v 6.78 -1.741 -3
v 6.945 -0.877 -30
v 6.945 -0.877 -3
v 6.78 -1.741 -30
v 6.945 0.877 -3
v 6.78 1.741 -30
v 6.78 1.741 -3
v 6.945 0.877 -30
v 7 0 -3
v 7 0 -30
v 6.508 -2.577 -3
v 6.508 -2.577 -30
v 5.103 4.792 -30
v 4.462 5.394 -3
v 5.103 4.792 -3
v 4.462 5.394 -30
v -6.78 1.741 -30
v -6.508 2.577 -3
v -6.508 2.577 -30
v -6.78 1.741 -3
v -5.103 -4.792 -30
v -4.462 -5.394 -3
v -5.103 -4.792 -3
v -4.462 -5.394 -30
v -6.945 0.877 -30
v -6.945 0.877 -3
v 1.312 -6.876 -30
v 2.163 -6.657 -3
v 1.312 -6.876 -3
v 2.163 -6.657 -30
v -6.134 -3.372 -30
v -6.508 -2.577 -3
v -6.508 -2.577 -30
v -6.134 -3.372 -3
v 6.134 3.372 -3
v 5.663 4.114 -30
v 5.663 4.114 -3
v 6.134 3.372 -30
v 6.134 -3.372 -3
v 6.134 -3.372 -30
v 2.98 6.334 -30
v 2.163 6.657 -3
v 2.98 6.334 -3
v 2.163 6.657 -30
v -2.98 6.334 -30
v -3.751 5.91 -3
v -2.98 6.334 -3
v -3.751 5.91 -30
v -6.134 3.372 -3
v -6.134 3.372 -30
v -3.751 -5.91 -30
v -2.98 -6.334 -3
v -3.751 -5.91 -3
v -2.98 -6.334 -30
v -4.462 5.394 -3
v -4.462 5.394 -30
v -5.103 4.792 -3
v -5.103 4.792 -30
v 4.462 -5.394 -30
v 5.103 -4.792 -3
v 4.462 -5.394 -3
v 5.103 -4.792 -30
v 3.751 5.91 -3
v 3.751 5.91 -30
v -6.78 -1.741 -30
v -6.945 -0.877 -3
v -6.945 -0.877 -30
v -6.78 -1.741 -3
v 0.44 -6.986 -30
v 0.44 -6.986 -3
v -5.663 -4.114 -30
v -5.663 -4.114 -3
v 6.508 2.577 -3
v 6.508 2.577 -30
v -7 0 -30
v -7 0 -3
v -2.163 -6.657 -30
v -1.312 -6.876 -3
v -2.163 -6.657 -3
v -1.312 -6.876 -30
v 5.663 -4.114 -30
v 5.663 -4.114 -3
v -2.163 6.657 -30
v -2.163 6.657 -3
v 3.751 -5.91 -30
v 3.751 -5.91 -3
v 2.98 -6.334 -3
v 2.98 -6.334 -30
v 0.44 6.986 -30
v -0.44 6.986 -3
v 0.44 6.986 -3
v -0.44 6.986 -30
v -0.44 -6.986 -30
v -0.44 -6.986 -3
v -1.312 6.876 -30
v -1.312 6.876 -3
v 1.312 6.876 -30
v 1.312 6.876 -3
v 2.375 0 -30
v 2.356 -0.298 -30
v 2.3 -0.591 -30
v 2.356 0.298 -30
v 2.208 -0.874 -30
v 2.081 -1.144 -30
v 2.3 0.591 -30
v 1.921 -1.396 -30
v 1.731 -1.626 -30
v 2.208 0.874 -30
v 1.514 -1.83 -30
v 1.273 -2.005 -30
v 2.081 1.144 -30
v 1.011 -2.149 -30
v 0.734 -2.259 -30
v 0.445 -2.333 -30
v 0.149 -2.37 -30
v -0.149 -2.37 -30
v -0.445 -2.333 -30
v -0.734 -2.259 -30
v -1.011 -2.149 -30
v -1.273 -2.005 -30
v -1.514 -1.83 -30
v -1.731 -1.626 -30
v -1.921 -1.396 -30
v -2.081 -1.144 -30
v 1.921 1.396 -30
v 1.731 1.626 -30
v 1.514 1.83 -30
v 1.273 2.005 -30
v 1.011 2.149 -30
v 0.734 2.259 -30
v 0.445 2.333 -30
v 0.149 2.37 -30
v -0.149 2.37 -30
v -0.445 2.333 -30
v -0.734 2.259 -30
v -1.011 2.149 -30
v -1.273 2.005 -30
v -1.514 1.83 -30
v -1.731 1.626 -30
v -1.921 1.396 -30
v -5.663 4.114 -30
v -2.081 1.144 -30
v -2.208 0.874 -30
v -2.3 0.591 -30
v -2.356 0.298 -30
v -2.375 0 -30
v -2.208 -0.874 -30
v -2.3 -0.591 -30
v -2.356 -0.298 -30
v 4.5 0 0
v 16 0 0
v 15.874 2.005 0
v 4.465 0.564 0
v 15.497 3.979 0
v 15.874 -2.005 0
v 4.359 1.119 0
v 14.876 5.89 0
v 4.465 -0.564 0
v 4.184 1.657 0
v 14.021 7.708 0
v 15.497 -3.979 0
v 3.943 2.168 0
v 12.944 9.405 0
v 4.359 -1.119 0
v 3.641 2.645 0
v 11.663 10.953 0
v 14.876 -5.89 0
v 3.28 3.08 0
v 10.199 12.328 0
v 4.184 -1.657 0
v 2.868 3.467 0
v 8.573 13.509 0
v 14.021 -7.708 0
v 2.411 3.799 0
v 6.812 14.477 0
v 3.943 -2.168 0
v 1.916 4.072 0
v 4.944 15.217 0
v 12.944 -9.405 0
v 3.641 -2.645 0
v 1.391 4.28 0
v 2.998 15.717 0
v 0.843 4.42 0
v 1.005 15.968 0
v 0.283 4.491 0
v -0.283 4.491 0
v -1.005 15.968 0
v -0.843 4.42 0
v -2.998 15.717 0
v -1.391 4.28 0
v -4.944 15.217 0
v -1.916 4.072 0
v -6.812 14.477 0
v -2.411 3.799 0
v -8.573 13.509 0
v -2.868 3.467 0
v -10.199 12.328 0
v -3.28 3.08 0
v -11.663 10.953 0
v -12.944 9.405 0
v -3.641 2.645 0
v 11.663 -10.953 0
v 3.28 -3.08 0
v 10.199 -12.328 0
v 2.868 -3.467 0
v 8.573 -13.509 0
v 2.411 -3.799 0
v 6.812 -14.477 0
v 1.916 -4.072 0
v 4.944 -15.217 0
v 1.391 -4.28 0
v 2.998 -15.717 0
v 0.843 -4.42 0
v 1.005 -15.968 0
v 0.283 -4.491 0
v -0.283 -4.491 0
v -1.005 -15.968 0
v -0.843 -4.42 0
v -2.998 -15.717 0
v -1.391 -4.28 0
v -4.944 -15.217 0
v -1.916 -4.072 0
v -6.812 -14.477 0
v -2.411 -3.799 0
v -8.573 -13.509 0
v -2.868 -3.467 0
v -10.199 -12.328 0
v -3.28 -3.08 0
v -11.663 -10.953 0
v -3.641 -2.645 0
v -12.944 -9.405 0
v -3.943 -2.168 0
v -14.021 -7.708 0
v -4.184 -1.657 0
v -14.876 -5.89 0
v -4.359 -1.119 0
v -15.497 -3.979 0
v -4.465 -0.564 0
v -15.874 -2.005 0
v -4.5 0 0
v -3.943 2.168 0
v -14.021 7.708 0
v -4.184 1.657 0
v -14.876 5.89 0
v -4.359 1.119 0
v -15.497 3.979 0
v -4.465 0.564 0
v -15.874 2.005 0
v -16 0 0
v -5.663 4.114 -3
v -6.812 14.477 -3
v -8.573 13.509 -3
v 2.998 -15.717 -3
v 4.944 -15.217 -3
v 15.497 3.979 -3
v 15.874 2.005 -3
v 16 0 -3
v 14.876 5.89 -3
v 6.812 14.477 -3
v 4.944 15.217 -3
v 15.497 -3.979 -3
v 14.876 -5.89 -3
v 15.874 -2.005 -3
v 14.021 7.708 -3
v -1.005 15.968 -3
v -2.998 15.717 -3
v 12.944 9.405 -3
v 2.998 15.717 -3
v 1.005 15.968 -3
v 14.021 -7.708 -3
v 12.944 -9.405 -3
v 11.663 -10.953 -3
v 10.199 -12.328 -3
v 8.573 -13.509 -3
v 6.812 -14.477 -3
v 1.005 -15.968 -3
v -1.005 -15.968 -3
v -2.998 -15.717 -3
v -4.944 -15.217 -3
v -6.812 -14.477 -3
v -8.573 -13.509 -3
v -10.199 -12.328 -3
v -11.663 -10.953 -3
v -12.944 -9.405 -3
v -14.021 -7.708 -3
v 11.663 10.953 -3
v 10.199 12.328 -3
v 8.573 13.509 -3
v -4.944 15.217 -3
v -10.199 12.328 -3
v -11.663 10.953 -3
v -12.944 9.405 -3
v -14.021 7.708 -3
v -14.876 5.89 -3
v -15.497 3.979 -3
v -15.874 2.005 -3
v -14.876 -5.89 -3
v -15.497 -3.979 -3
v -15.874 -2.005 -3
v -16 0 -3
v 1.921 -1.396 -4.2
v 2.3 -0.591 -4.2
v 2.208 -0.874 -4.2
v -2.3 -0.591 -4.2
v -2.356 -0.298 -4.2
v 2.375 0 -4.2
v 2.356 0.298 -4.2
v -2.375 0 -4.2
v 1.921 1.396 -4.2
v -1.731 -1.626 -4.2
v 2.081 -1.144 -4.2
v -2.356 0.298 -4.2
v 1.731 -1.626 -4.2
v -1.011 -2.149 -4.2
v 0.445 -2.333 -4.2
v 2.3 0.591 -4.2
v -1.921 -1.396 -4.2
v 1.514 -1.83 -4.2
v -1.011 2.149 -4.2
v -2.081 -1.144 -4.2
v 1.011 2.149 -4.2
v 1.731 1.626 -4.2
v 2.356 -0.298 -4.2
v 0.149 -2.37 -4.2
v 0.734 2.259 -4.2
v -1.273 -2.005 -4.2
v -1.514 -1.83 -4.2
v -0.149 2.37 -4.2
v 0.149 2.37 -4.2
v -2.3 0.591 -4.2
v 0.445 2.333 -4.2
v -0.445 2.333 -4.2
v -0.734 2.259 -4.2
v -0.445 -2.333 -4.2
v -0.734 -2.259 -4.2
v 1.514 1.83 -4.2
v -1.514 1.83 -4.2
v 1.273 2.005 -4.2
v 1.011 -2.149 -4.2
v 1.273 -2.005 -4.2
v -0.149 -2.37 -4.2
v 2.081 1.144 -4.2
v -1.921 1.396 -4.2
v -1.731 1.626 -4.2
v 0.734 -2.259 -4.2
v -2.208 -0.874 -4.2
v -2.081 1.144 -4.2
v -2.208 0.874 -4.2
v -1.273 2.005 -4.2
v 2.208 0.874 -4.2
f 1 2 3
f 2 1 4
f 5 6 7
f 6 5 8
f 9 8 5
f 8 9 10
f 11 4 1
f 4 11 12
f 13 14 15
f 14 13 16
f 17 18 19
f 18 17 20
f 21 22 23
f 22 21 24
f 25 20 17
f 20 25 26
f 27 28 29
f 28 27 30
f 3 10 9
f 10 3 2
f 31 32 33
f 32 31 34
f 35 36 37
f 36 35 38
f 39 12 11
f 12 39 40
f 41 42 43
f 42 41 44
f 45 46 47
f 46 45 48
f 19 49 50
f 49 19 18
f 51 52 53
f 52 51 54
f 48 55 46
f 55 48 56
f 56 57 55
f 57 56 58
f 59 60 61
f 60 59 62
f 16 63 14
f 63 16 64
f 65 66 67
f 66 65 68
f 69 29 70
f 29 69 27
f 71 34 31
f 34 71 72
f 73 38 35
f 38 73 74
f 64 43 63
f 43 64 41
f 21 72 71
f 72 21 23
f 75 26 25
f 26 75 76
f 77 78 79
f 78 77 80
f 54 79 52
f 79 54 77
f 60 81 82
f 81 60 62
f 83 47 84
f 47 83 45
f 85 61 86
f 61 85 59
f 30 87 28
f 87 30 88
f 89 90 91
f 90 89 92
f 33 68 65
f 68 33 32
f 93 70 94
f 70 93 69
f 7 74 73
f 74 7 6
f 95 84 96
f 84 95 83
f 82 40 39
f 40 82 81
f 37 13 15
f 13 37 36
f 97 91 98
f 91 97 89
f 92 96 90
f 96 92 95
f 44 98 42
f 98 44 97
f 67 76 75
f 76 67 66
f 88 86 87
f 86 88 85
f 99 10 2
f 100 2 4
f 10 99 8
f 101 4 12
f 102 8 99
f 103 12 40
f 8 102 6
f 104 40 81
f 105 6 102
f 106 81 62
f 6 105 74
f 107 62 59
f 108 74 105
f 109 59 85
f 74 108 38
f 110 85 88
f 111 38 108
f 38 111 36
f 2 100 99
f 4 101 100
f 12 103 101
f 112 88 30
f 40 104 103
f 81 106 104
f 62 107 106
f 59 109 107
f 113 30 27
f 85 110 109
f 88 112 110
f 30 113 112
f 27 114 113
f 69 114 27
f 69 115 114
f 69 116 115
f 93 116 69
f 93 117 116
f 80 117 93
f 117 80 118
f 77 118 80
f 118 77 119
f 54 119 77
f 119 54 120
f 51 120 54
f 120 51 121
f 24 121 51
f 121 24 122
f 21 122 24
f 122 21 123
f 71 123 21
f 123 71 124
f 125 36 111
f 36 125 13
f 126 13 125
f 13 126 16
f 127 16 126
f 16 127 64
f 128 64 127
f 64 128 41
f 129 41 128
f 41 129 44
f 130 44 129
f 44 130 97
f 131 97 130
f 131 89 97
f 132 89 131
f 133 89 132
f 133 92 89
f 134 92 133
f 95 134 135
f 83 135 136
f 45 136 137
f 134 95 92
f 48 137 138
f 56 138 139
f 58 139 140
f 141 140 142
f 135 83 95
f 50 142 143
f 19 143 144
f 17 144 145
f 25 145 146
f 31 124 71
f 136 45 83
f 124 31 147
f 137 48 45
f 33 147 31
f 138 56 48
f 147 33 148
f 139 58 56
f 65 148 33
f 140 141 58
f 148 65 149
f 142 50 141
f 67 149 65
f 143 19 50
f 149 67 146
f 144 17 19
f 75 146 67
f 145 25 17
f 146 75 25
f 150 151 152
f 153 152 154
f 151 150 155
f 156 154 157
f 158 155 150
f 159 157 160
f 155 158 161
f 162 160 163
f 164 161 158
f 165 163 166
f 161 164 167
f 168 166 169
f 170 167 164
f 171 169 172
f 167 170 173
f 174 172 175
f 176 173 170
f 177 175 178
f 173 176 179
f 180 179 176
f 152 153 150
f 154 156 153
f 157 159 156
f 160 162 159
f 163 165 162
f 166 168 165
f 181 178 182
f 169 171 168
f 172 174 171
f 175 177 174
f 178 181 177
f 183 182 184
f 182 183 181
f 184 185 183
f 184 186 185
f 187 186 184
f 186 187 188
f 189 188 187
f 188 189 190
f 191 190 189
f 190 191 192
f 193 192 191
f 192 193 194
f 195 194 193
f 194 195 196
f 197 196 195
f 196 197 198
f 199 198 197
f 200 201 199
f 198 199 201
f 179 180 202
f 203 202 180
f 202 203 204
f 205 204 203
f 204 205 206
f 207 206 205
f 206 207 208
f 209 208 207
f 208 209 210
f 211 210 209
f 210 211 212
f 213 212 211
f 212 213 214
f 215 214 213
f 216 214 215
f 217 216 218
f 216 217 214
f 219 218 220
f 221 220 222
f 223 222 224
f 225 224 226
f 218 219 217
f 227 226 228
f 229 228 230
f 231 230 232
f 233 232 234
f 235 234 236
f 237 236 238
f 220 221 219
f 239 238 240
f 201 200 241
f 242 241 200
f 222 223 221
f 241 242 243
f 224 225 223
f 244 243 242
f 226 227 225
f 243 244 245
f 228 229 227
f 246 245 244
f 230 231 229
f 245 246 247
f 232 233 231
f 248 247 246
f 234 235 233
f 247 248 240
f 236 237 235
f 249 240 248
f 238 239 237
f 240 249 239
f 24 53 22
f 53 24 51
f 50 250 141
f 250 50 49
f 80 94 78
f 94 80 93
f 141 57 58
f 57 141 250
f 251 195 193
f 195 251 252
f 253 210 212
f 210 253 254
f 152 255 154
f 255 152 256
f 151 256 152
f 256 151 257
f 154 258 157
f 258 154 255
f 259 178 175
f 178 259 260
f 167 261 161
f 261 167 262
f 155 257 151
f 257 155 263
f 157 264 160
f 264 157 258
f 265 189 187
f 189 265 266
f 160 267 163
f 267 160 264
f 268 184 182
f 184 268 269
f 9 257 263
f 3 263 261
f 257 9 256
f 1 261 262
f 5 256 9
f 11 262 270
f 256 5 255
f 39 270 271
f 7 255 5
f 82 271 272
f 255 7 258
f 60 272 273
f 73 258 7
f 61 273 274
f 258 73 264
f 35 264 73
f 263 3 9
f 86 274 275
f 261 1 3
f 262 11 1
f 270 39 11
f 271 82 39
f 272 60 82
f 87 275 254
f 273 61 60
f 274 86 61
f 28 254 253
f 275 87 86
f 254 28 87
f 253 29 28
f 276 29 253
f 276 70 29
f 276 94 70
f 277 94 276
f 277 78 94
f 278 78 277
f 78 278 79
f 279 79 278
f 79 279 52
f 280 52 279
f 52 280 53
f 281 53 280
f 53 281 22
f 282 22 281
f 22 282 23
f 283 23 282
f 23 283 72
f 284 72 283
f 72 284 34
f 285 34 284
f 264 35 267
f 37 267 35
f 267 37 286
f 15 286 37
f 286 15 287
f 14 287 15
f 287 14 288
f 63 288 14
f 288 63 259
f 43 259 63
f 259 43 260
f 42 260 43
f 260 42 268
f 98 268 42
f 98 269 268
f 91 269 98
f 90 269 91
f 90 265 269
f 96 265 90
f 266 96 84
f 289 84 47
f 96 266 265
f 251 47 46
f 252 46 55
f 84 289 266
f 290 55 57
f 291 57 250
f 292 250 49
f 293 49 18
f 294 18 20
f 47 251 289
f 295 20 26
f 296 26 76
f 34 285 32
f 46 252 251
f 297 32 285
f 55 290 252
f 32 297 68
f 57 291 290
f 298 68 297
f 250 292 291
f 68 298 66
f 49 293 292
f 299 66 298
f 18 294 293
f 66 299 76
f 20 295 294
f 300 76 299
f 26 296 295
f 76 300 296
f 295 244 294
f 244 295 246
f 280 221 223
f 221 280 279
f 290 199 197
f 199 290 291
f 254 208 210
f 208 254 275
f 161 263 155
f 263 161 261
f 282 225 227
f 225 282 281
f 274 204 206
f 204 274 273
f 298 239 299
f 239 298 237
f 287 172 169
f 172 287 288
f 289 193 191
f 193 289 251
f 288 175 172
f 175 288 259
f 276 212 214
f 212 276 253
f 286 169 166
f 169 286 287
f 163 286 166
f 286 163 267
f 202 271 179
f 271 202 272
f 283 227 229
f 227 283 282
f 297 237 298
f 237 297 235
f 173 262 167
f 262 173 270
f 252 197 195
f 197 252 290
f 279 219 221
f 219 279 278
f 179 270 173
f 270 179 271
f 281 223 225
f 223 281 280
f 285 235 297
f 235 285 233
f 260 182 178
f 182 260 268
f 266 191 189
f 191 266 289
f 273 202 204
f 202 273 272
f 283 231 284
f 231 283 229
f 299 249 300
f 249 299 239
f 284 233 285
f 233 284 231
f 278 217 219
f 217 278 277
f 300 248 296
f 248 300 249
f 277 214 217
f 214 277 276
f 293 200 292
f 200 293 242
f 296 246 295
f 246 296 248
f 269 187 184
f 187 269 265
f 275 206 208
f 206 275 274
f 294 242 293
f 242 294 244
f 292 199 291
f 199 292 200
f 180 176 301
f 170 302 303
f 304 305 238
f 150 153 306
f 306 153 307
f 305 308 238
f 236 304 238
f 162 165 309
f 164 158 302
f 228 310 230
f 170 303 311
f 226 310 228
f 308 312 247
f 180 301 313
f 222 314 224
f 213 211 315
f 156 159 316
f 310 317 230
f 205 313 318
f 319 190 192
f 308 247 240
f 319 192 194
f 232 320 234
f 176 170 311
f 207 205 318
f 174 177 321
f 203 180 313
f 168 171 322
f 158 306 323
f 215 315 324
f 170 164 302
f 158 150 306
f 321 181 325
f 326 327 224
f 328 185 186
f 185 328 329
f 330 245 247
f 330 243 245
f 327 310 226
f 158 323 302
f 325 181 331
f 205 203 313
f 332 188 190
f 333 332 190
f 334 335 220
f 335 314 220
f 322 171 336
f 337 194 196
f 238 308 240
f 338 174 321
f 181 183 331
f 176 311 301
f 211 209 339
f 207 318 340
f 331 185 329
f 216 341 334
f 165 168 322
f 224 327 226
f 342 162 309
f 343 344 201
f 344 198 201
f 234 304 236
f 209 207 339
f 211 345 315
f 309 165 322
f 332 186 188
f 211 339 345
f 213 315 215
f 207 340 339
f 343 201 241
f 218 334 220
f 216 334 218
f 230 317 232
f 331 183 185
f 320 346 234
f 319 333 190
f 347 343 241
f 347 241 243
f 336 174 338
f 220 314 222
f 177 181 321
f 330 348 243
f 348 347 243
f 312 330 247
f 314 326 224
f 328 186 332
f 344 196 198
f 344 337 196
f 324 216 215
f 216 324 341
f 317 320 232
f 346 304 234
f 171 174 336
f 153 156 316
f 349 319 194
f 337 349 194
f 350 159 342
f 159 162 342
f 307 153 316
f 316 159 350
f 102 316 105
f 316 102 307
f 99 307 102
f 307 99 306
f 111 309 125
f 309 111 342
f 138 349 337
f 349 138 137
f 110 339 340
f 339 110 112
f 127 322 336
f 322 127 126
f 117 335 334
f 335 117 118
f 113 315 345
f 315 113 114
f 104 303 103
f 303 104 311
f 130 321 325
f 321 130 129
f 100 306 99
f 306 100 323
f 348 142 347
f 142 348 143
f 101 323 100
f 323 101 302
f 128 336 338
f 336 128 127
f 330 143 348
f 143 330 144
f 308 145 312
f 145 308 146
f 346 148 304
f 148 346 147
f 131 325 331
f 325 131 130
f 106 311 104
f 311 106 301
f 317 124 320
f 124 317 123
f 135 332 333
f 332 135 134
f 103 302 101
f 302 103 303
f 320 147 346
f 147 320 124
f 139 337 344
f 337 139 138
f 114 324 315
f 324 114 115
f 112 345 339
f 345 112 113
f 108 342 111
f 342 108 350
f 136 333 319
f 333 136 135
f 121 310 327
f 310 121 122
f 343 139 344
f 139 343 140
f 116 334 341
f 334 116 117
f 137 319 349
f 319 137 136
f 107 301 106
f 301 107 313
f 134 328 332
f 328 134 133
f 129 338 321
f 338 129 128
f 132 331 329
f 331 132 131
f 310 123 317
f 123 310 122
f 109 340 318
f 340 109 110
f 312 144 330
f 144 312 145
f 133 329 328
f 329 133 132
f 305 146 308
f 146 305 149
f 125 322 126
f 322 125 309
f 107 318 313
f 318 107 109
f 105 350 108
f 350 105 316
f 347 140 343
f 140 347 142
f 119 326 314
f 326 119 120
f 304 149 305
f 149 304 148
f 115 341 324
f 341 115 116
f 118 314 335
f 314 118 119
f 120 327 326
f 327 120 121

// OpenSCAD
$fn = 50;


difference() {
	union() {
		translate(v = [0, 0, -30.0000000000]) {
			cylinder(h = 30, r = 7.0000000000);
		}
		translate(v = [0, 0, -3.0000000000]) {
			cylinder(h = 3, r = 16.0000000000);
		}
	}
	union() {
		translate(v = [0, 0, 0]) {
			rotate(a = [0, 0, 0]) {
				difference() {
					union() {
						#translate(v = [0, 0, -30.0000000000]) {
							cylinder(h = 30, r = 2.2500000000);
						}
						#translate(v = [0, 0, -4.2000000000]) {
							cylinder(h = 4.2000000000, r = 7.0000000000, r1 = 2.3750000000, r2 = 4.5000000000);
						}
						#translate(v = [0, 0, -30.0000000000]) {
							cylinder(h = 30, r = 2.3750000000);
						}
						#translate(v = [0, 0, -30.0000000000]) {
							cylinder(h = 30, r = 2.2500000000);
						}
					}
					union();
				}
			}
		}
	}
}
